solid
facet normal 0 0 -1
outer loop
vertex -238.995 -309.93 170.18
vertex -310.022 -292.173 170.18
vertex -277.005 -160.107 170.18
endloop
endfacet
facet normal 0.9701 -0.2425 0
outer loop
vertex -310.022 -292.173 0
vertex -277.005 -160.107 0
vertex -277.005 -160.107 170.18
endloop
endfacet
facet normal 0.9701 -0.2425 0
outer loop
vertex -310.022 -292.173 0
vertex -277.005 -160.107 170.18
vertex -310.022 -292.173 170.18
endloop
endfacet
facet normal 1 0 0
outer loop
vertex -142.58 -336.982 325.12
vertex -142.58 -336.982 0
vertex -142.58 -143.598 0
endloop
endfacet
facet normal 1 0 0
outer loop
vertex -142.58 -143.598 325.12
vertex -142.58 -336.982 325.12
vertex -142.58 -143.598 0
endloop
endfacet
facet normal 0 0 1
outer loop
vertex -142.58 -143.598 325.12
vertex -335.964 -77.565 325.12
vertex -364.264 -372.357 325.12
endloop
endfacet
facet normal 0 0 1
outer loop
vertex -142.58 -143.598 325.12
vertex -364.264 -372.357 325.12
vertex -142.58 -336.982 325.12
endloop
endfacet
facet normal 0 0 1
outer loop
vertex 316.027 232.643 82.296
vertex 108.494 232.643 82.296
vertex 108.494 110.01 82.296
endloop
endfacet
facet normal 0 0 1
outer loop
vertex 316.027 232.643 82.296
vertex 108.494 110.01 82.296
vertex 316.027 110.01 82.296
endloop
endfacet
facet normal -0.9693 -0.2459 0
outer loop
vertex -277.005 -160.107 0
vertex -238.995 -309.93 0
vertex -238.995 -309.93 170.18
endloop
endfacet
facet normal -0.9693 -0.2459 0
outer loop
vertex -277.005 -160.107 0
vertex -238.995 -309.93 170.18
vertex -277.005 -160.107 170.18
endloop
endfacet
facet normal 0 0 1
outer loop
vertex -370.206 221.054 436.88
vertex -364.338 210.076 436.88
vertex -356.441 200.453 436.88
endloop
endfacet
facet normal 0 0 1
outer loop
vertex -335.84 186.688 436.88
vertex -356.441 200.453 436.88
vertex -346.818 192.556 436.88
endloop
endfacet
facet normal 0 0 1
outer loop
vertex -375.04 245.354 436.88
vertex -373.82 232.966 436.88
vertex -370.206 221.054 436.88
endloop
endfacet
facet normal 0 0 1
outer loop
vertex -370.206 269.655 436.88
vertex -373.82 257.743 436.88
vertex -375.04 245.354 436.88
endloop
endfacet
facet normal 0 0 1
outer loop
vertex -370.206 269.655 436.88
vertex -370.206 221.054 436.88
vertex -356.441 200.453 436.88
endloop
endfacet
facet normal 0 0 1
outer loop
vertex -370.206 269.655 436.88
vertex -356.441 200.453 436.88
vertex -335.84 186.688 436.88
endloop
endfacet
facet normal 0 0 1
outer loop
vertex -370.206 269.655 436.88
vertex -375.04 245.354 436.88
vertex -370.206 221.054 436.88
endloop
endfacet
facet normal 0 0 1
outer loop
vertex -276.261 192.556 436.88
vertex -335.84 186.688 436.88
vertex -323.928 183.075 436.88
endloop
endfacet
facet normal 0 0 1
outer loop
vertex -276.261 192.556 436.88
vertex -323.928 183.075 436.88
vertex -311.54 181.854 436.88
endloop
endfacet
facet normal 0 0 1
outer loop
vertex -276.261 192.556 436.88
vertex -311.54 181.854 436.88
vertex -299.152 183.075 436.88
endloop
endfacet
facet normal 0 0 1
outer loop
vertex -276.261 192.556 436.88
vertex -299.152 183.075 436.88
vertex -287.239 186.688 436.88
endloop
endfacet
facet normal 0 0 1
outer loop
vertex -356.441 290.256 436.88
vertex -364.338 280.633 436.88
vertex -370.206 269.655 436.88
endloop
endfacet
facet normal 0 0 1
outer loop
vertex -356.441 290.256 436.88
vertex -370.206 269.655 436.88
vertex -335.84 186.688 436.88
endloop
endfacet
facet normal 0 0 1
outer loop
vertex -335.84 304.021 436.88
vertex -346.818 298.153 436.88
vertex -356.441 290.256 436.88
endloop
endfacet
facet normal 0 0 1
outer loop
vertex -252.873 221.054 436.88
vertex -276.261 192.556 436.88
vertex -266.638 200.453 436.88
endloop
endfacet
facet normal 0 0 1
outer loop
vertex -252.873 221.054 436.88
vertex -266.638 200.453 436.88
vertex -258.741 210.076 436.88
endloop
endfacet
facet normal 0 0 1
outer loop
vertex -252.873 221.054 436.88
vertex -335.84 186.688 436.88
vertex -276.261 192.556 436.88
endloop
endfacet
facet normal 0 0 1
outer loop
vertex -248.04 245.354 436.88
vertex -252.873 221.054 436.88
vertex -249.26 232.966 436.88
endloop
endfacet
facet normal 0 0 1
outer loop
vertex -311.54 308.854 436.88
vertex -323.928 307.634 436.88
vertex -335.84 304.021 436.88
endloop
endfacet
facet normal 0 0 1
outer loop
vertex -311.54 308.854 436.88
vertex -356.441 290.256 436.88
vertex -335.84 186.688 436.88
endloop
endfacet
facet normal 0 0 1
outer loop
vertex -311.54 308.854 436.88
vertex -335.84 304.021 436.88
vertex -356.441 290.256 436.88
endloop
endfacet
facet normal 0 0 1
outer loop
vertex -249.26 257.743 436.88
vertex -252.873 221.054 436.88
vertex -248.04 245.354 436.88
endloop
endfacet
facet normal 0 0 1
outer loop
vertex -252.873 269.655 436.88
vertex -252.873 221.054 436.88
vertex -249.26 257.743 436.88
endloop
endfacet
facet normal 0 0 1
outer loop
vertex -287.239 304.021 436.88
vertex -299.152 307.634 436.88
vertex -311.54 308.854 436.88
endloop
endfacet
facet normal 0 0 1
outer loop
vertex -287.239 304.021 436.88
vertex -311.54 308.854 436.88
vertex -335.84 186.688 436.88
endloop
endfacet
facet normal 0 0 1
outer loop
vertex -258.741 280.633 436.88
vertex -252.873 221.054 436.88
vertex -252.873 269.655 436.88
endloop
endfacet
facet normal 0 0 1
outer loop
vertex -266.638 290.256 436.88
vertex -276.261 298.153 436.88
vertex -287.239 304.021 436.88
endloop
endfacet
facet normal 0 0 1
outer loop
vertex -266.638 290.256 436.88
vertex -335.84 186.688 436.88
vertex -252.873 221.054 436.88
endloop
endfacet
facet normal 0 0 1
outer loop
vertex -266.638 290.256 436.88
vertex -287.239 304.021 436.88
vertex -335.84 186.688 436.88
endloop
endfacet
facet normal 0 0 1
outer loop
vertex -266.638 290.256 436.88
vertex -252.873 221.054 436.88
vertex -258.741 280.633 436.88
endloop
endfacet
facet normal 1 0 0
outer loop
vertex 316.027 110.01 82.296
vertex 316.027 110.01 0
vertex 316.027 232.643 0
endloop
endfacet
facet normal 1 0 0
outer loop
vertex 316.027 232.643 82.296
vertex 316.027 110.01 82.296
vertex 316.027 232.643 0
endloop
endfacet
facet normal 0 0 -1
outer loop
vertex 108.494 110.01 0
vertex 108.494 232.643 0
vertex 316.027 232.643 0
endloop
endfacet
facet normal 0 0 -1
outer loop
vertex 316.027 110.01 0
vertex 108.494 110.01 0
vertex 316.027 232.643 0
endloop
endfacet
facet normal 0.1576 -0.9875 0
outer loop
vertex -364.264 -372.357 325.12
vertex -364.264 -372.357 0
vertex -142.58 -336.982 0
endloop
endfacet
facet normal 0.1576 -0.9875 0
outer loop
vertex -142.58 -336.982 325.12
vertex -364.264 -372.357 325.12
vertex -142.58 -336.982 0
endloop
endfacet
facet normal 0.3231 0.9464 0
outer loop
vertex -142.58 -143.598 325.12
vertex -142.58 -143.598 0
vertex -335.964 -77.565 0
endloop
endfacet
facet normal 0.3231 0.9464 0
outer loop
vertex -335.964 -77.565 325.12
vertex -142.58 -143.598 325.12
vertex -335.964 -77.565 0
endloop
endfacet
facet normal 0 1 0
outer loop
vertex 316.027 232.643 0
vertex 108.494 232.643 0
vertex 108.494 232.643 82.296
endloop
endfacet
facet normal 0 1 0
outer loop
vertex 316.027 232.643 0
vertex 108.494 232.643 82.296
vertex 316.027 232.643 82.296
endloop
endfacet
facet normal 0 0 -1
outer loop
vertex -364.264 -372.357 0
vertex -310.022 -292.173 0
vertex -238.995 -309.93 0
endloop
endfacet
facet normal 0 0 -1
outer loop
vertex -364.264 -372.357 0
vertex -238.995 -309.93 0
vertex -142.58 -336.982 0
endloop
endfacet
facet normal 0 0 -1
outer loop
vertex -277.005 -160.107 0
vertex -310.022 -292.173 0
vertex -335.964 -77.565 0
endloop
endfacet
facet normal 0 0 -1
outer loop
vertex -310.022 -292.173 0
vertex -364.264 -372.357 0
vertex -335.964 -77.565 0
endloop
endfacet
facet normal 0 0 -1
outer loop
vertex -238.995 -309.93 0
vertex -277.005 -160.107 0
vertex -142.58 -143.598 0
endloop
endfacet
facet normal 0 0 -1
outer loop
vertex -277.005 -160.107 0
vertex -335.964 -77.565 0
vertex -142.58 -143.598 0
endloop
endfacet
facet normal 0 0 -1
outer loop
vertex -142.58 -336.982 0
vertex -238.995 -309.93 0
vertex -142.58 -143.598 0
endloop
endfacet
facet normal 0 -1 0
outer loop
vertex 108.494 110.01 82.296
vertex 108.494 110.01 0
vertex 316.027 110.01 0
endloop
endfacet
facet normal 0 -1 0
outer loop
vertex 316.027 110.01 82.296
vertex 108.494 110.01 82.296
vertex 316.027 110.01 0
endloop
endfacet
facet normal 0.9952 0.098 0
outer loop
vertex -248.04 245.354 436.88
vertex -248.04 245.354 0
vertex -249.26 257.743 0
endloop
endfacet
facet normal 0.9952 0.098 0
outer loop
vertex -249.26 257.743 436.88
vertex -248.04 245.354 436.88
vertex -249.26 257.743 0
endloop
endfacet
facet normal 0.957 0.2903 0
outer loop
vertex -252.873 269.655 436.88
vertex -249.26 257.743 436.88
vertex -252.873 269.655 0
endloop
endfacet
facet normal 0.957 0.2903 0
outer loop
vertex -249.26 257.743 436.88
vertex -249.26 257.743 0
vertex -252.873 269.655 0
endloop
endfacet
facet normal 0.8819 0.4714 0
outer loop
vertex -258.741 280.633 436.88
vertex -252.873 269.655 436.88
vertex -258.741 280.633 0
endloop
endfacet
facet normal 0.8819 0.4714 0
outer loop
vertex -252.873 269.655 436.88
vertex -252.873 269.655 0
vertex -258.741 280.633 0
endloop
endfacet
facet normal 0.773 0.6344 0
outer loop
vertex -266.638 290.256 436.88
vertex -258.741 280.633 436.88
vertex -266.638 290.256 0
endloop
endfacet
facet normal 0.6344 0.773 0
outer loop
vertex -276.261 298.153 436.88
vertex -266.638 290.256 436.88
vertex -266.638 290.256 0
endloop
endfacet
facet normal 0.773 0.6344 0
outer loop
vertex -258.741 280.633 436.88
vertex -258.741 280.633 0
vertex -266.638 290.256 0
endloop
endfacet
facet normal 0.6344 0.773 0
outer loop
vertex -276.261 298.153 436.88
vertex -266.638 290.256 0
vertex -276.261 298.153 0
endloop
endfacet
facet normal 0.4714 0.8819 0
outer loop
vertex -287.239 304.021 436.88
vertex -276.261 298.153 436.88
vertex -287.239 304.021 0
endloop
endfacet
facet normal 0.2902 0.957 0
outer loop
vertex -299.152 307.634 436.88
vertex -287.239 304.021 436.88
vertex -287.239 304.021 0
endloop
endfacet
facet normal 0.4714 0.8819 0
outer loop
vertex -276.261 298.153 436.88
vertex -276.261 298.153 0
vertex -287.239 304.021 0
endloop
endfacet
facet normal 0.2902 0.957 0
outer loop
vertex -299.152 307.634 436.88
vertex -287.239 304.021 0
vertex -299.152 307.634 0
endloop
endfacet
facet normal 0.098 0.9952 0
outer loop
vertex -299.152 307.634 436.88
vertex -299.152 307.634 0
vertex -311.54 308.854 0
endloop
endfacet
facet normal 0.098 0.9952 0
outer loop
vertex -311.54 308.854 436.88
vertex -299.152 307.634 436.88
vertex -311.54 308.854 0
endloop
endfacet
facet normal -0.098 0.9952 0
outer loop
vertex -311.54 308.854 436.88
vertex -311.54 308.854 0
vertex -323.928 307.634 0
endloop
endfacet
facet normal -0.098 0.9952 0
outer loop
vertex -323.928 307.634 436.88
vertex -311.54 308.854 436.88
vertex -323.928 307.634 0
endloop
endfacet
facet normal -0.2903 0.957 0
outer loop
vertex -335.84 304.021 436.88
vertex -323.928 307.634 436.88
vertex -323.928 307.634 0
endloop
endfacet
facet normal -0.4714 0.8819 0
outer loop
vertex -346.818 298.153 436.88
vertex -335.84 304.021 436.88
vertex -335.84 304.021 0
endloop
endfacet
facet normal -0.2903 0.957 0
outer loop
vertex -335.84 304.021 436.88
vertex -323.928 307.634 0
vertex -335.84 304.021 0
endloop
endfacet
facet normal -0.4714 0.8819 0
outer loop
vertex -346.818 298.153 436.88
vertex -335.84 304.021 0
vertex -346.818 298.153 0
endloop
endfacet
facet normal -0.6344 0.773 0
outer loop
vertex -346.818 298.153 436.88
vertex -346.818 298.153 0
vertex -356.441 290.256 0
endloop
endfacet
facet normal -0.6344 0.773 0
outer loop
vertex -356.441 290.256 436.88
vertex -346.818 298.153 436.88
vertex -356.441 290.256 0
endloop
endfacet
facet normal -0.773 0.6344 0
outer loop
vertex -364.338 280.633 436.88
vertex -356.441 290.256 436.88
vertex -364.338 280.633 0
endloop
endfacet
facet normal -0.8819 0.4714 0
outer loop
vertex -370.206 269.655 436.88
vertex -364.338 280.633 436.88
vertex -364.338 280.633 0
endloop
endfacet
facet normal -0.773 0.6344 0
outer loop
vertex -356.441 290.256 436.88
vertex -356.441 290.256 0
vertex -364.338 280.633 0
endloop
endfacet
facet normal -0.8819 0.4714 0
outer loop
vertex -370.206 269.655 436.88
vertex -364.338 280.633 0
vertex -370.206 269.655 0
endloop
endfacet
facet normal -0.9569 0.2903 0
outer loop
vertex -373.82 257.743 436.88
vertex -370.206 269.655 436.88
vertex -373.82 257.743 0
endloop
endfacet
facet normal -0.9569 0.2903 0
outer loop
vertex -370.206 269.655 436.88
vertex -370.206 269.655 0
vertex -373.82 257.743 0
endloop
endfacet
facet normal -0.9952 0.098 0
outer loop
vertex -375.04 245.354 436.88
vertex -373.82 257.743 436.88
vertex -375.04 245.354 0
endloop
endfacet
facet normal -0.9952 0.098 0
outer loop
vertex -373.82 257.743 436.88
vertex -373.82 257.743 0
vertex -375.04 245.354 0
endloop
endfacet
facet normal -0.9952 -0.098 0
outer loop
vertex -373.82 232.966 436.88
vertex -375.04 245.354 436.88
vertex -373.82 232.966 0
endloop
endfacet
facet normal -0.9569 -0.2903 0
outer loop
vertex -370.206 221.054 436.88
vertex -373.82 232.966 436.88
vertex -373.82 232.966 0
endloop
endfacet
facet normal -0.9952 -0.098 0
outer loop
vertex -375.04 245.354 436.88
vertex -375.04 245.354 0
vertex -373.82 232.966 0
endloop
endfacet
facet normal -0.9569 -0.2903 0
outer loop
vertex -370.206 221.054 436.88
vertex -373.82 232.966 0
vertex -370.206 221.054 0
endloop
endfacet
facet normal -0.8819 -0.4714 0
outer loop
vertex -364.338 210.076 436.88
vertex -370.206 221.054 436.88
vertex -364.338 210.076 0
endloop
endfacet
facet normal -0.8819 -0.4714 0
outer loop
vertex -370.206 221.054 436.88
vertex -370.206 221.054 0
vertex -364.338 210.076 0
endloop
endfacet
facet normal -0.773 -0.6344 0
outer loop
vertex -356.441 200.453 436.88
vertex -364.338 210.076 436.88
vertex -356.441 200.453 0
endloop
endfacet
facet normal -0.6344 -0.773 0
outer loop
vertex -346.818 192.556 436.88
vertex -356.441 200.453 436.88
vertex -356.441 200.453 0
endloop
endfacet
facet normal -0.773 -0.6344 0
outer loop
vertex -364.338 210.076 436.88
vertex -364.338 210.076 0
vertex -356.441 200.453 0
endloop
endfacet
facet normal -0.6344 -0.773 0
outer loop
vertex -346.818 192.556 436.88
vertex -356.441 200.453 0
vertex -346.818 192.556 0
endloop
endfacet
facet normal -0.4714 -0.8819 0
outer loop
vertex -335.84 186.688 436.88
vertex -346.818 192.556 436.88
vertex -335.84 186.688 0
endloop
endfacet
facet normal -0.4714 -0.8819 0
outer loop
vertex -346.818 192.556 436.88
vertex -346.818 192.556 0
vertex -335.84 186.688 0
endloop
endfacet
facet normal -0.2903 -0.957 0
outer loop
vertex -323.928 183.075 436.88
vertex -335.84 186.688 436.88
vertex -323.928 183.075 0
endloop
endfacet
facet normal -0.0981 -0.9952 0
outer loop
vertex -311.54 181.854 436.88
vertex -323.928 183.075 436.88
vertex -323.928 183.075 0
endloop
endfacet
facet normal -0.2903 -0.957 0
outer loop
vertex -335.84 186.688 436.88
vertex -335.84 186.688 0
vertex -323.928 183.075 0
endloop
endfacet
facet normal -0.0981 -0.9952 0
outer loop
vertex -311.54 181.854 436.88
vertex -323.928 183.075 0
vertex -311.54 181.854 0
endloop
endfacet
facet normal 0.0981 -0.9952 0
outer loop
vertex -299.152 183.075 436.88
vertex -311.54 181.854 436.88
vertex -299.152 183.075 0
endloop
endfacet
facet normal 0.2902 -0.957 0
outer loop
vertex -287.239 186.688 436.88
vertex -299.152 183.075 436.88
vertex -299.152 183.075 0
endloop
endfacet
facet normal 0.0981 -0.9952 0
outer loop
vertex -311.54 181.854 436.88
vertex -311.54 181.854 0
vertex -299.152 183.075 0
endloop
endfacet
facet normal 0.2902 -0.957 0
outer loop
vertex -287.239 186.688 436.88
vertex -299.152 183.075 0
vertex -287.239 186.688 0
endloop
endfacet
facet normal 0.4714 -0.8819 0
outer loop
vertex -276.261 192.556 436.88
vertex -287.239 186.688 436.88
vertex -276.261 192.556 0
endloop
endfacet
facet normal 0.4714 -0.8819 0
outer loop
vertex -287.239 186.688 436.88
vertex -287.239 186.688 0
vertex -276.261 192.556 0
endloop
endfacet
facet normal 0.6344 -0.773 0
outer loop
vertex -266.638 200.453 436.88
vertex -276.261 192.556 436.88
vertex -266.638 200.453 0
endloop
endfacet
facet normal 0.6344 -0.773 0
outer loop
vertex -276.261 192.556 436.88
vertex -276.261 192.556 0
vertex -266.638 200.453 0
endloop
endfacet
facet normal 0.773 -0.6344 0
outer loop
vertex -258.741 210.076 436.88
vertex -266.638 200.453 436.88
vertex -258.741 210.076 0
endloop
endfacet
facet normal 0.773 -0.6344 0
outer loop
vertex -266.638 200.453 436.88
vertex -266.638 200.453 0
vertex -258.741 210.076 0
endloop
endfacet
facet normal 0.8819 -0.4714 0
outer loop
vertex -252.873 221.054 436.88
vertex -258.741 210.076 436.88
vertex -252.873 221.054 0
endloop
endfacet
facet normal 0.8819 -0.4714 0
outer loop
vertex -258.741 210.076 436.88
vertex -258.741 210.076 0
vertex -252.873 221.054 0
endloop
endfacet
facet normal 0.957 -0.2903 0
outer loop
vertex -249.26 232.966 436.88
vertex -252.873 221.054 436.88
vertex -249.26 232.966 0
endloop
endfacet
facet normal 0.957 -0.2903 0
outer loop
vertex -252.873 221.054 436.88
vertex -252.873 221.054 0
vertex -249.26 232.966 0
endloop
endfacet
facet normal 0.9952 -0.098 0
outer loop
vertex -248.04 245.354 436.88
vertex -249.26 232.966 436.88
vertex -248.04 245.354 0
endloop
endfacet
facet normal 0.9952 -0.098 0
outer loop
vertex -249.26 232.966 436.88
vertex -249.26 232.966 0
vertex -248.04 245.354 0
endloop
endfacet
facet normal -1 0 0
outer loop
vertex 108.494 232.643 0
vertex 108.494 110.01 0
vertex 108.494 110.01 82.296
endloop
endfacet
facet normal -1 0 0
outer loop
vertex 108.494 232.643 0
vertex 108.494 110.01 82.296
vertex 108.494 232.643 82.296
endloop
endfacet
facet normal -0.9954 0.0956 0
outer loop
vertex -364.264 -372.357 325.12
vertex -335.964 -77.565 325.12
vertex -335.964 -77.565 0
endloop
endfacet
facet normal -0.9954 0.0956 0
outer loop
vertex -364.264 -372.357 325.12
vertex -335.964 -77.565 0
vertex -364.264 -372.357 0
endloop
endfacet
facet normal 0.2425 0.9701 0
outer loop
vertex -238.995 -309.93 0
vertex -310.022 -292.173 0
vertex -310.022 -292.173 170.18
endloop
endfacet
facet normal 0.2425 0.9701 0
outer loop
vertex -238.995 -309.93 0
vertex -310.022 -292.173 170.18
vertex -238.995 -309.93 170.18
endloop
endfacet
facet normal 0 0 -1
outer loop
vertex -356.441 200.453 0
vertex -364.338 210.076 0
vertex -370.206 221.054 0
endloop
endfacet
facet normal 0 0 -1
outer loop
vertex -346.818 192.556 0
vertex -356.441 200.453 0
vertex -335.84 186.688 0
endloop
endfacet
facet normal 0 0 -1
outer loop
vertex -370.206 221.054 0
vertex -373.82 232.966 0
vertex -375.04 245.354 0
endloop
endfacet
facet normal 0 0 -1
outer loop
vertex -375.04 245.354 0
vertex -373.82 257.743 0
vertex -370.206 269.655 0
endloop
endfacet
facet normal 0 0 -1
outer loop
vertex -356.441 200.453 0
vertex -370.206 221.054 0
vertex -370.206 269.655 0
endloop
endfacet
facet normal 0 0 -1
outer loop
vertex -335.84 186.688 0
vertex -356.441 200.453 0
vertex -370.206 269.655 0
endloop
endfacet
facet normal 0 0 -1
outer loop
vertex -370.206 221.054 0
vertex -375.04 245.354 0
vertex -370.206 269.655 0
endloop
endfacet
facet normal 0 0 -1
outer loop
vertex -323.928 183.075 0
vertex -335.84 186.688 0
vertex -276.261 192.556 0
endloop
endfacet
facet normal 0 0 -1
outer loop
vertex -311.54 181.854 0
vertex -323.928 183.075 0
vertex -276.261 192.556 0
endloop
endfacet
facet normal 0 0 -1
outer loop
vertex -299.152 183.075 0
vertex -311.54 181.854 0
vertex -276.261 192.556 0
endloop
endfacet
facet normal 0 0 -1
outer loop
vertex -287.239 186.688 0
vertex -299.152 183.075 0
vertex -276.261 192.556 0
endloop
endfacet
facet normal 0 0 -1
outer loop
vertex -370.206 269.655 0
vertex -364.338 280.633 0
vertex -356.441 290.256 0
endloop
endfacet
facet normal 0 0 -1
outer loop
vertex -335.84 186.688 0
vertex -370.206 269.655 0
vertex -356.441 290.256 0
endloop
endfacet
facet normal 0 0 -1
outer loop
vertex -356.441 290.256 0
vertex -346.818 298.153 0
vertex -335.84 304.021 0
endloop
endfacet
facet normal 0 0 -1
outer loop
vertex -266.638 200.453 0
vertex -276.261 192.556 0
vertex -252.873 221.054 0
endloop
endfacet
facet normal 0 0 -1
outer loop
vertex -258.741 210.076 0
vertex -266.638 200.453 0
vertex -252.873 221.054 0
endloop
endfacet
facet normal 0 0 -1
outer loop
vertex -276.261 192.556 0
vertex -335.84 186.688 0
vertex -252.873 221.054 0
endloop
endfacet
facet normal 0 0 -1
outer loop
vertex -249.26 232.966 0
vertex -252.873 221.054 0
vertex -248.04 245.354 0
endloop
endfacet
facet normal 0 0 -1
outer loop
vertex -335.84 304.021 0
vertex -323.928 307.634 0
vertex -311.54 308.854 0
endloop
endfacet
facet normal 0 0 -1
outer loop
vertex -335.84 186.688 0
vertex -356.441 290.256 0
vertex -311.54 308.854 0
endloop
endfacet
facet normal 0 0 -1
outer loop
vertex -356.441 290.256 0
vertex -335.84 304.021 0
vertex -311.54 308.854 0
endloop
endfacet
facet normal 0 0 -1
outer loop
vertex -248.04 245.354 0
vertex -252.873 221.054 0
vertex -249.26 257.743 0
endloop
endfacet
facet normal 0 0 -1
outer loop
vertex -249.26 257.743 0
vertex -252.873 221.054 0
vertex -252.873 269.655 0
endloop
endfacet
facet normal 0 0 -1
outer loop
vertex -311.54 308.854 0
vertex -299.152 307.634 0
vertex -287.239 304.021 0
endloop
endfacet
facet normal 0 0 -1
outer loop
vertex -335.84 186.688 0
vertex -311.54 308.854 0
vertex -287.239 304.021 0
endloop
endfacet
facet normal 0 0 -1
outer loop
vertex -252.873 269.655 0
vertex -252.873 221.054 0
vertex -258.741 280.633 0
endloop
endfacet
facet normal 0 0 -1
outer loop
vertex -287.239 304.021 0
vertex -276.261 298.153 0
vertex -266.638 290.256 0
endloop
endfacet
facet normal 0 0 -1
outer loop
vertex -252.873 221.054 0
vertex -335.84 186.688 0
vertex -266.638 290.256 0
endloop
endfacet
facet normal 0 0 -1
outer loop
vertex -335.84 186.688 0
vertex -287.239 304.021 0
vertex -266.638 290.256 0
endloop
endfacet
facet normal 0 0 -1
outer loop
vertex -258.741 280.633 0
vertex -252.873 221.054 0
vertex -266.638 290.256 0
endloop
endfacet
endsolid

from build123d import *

# Parameters (mm, degrees)
F0_W     = 207.533106
F0_H     = 122.63321
F1_DEPTH = 82.296
F0_R     = 63.5
F2_DEPTH = 436.88
F3_DEPTH = 325.12
F4_DEPTH = 170.18


with BuildPart() as f1:
    # F0 (on Top) → F1 (new body)
    with BuildSketch(Plane.XY):
        with Locations((212.260927, 171.326202)):
            Rectangle(F0_W, F0_H)
    extrude(amount=F1_DEPTH)


with BuildPart() as f2:
    # F0 (on Top) → F2 (new body)
    with BuildSketch(Plane.XY):
        with Locations((-311.539739, 245.354399)):
            Circle(F0_R)
    extrude(amount=F2_DEPTH)


with BuildPart() as f3:
    # F0 (on Top) → F3 (new body)
    with BuildSketch(Plane.XY):
        Polygon((-142.58042, -143.598471), (-335.963554, -77.565193), (-364.263541, -372.356556), (-142.58042, -336.981594), align=None)
        Polygon((-310.021927, -292.173275), (-277.005283, -160.106761), (-238.994548, -309.930128), align=None, mode=Mode.SUBTRACT)
        Polygon((-238.994548, -309.930128), (-277.005283, -160.106761), (-310.021927, -292.173275), align=None)
    extrude(amount=F3_DEPTH)

    # F0 (on Top) → F4 (cut)
    with BuildSketch(Plane.XY):
        Polygon((-238.994548, -309.930128), (-277.005283, -160.106761), (-310.021927, -292.173275), align=None)
    extrude(amount=F4_DEPTH, mode=Mode.SUBTRACT)


solid = Compound([f1.part, f2.part, f3.part])
